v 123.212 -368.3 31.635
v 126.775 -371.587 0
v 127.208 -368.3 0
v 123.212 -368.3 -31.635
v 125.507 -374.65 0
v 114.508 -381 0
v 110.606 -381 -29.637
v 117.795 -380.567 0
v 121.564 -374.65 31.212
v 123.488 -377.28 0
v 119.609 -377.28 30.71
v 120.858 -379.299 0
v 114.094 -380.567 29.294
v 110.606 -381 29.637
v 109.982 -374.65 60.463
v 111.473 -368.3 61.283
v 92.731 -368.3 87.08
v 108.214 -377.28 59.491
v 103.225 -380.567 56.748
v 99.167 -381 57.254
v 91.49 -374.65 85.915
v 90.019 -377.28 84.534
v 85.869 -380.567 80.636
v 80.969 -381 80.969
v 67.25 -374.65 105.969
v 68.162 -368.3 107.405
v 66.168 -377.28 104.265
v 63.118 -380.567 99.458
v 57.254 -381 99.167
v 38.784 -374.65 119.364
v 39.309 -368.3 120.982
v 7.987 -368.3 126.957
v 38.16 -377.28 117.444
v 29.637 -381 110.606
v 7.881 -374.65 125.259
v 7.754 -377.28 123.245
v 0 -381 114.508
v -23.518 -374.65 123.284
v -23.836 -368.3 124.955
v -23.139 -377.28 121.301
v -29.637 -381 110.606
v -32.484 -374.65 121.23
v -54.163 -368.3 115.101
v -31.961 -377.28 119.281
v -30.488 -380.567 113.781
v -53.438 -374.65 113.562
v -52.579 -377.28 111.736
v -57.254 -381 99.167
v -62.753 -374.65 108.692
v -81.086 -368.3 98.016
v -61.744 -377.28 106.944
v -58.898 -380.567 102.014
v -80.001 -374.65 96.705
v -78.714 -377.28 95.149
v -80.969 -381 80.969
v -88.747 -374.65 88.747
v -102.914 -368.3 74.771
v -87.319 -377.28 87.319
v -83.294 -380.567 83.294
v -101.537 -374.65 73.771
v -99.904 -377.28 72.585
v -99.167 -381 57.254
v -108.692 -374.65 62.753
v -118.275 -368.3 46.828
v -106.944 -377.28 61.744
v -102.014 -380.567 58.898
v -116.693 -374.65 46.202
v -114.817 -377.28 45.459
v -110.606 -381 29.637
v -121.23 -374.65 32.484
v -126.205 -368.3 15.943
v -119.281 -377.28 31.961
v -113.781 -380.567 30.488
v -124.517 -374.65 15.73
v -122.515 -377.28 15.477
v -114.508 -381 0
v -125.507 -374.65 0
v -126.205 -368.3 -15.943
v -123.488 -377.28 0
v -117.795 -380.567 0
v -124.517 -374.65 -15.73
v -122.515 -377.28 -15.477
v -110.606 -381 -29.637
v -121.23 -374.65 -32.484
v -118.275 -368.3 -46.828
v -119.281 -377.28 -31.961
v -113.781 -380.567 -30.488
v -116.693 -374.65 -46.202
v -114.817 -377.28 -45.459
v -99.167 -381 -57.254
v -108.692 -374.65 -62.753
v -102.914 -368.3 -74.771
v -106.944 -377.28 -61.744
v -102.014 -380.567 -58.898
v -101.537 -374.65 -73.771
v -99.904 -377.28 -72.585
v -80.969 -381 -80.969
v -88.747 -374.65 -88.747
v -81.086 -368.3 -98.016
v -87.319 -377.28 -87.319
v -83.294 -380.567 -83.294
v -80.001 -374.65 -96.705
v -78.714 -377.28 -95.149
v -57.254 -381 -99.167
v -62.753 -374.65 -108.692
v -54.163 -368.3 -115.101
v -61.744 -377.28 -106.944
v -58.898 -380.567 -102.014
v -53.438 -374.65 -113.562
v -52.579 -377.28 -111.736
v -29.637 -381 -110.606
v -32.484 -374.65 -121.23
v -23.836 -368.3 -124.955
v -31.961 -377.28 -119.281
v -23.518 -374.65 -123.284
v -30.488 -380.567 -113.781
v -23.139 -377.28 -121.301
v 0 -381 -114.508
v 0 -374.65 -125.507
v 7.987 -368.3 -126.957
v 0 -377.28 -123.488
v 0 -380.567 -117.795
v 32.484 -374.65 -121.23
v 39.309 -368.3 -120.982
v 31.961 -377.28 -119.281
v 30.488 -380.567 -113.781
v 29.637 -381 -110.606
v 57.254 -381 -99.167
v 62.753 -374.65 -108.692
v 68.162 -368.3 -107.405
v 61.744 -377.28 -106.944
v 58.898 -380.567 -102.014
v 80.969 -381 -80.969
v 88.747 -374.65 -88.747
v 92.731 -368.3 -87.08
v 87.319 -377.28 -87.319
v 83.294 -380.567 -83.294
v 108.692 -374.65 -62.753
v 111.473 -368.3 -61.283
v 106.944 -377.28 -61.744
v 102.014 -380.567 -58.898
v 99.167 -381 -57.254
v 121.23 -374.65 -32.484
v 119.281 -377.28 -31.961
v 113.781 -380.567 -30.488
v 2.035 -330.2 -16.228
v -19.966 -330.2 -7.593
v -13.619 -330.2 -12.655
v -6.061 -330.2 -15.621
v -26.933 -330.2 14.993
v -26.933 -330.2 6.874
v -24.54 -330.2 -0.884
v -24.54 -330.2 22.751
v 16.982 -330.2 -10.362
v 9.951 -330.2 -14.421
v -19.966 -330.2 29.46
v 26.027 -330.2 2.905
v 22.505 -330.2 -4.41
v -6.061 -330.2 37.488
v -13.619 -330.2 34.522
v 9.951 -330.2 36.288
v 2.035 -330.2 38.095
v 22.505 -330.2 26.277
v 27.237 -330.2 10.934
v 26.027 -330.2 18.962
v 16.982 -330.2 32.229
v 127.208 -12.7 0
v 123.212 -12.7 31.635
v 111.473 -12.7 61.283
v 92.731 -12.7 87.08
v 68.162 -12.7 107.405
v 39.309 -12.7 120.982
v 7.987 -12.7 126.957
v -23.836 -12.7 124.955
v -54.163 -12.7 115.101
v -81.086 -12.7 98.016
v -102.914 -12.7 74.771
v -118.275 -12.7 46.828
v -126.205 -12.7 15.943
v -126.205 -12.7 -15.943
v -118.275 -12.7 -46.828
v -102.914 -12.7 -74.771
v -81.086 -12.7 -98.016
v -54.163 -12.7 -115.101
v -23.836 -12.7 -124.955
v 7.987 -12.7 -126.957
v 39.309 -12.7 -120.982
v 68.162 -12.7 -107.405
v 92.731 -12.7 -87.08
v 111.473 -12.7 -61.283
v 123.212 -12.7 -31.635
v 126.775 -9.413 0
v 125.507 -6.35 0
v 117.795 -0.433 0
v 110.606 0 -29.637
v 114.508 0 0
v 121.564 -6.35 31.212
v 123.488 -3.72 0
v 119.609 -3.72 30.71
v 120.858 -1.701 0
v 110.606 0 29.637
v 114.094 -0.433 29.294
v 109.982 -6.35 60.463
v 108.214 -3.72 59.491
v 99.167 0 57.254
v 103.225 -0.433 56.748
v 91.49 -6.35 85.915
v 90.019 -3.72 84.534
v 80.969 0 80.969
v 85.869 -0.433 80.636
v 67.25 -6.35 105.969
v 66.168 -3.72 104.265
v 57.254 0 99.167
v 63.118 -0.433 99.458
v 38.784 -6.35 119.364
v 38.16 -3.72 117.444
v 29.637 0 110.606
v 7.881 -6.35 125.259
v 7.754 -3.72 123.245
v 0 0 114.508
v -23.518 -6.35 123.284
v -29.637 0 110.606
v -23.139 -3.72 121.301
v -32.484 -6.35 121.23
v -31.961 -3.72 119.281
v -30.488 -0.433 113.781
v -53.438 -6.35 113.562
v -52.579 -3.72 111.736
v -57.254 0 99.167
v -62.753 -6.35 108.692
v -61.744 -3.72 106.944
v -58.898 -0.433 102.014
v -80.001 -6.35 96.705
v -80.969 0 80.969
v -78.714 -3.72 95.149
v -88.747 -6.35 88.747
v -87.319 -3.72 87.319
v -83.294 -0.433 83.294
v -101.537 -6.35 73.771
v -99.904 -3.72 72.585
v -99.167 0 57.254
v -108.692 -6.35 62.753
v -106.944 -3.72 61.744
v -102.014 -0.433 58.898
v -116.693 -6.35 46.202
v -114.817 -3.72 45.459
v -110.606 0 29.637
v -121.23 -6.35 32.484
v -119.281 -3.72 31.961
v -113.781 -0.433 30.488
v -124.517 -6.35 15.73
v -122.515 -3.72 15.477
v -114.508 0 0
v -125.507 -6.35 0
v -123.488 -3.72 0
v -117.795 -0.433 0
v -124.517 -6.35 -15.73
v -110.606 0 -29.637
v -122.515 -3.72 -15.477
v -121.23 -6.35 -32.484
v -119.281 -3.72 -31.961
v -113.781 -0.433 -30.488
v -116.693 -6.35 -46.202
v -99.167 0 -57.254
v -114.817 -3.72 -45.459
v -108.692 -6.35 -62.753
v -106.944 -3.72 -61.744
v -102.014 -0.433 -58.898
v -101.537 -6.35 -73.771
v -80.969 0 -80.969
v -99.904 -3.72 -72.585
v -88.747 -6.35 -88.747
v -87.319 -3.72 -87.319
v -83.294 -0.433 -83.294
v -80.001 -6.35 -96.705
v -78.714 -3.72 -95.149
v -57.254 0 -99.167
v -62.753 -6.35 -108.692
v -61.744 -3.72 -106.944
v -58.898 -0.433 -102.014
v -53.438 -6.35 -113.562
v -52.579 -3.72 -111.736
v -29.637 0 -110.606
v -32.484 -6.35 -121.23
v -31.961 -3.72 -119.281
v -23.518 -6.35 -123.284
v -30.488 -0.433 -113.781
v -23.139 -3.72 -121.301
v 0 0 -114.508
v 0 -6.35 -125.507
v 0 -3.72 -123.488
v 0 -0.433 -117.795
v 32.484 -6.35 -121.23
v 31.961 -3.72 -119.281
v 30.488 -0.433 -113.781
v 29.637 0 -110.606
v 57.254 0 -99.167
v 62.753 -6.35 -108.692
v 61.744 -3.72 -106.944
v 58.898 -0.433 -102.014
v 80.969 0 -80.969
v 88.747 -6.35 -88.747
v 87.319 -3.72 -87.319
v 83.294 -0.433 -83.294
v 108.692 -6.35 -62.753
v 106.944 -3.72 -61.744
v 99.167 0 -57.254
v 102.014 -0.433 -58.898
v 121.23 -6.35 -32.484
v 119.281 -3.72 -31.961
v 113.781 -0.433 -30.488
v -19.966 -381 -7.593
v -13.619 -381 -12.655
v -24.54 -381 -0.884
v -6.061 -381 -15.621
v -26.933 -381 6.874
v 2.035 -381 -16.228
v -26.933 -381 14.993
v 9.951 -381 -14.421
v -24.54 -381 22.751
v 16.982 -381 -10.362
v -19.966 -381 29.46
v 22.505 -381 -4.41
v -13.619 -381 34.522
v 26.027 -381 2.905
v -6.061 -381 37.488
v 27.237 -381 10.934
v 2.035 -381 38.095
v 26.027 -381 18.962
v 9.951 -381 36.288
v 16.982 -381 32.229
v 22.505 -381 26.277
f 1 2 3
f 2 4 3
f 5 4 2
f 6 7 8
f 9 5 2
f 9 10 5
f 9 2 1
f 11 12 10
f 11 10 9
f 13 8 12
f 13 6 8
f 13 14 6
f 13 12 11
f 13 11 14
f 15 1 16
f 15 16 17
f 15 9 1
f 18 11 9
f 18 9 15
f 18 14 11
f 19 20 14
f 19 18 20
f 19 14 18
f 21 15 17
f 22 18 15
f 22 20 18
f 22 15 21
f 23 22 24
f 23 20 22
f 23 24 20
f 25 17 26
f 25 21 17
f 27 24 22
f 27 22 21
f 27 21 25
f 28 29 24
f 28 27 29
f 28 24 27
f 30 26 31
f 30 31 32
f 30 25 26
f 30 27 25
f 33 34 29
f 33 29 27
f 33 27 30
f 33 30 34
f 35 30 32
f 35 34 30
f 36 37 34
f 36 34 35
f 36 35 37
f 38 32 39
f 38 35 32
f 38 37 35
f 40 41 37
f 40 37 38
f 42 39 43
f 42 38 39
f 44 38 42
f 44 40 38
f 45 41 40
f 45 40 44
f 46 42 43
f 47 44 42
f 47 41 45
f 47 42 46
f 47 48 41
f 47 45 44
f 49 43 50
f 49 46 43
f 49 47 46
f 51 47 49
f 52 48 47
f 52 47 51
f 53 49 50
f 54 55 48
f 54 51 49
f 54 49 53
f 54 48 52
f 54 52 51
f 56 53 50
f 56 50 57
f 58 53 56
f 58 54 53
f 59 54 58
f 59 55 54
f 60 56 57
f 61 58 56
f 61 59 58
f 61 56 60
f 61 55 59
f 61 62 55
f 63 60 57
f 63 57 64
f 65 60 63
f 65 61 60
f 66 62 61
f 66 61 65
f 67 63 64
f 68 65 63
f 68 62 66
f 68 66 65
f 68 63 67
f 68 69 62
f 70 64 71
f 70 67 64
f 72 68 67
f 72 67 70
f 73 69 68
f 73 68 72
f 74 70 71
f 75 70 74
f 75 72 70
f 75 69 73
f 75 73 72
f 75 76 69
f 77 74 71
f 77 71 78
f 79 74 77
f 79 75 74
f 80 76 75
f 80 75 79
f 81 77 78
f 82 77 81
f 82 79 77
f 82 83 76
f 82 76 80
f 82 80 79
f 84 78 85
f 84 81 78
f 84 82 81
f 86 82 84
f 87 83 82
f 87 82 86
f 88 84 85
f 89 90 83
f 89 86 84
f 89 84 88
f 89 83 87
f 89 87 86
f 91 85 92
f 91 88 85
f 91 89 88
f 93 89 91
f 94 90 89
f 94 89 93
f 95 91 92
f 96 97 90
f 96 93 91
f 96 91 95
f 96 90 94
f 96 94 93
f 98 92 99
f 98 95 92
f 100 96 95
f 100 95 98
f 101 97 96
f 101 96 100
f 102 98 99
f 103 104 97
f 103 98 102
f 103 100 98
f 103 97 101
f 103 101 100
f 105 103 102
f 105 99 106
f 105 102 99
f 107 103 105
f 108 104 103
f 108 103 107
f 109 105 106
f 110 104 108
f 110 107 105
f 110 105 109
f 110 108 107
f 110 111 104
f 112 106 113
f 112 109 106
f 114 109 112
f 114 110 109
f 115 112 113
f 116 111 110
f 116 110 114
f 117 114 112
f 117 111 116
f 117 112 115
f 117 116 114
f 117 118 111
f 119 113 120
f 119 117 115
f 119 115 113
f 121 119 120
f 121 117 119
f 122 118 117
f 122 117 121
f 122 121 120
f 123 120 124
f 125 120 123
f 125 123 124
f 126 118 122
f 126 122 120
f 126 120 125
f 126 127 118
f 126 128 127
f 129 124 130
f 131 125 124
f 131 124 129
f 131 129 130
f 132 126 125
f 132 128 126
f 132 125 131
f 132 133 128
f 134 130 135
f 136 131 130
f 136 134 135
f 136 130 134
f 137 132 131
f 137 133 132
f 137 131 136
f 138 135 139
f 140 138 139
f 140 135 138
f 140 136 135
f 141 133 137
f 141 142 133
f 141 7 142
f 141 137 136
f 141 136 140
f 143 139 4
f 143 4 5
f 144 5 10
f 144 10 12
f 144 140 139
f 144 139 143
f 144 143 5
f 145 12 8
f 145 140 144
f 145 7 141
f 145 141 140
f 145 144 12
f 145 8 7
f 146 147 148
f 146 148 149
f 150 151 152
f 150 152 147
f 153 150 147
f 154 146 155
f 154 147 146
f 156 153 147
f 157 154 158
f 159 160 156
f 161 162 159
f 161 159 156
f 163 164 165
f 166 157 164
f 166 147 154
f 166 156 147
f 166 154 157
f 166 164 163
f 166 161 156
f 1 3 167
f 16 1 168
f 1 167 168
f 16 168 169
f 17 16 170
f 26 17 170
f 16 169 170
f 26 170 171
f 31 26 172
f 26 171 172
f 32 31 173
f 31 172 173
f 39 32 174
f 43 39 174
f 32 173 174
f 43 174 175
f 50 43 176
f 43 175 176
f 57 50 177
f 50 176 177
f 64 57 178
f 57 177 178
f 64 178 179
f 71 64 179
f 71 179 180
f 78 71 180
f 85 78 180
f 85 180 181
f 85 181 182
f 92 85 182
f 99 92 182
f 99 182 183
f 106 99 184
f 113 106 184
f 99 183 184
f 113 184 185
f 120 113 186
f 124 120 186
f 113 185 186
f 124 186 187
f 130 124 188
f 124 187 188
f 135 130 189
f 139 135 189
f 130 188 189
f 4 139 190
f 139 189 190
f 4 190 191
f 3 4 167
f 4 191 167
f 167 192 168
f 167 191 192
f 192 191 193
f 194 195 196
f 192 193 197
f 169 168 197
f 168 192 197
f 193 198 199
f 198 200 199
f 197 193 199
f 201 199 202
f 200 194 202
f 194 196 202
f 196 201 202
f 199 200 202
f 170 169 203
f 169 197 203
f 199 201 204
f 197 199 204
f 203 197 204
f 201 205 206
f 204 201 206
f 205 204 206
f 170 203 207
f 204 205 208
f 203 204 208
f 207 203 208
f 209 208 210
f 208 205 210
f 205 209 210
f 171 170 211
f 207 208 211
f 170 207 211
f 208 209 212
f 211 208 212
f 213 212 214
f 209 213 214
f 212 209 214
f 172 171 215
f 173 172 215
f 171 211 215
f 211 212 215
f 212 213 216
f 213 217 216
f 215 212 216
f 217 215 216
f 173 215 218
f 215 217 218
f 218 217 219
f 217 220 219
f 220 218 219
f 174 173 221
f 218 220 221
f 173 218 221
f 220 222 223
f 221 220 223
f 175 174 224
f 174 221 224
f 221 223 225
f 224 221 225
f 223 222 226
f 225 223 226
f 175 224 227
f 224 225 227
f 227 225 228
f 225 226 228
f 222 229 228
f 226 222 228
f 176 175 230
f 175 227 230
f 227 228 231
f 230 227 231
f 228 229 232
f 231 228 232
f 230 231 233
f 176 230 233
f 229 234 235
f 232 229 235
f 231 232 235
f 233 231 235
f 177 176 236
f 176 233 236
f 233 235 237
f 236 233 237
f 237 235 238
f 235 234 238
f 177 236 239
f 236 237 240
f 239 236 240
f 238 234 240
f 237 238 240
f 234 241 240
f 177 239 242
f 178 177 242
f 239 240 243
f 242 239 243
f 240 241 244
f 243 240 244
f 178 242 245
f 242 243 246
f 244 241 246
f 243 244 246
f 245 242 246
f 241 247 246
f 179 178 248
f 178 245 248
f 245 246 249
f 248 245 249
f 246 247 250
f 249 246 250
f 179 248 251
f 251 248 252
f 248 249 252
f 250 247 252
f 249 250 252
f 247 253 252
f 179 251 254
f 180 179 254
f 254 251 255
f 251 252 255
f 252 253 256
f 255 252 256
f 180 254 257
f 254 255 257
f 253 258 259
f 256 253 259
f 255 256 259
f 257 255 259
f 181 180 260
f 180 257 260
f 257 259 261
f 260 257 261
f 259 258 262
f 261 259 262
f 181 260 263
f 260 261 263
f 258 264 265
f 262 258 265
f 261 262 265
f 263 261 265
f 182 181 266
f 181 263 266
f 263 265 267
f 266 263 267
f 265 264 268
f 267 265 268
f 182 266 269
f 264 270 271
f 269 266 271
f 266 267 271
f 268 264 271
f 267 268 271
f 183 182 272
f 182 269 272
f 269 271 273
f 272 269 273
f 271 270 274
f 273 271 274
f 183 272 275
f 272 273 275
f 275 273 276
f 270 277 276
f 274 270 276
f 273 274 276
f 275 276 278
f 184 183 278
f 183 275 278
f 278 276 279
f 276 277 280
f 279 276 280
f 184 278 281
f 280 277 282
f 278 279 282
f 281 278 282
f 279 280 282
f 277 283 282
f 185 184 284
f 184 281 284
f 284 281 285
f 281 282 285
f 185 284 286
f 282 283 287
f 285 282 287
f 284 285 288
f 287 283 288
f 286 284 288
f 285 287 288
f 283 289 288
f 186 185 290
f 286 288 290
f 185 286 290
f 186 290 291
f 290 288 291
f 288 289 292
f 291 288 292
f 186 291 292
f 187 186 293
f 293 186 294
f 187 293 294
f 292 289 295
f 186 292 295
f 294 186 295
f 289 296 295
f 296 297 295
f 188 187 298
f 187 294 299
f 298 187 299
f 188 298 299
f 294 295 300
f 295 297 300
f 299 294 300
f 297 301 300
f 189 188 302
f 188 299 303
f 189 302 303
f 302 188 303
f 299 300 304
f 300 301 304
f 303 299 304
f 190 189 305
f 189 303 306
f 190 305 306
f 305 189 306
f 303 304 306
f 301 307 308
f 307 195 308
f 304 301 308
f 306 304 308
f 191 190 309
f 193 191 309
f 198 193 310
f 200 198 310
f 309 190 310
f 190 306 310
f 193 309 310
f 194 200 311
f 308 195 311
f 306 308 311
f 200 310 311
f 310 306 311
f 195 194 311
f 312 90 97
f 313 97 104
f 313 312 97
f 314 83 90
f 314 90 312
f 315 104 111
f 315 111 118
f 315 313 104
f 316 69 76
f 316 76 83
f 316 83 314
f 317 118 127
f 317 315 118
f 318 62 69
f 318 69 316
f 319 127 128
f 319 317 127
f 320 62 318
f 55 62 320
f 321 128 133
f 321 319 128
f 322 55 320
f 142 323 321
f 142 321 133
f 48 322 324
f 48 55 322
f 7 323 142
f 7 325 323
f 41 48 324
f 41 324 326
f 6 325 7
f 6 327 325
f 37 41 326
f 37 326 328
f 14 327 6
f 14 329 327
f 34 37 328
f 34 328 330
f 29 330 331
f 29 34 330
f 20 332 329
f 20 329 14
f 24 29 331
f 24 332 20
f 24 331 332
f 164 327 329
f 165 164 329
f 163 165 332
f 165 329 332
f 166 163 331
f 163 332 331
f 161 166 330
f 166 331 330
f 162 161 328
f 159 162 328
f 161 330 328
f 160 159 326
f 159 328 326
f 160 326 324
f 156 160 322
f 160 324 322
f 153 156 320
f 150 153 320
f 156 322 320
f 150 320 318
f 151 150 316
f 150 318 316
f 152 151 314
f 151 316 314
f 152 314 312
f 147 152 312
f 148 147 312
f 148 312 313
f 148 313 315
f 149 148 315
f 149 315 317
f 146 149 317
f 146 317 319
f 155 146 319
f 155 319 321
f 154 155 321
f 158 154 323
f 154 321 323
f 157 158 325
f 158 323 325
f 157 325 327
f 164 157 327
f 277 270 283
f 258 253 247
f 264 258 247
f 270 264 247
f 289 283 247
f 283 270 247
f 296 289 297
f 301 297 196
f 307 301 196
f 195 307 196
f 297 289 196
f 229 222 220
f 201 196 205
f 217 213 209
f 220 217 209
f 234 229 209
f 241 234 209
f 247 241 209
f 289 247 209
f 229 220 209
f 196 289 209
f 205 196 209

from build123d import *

# Parameters (mm, degrees)
F0_R     = 127.208159
F1_DEPTH = 381
F2_R     = 27.237413
F3_DEPTH = 50.8
F4_R     = 12.7
F5_R     = 12.7


with BuildPart() as f1:
    # F0 (on Front) → F1 (new body)
    with BuildSketch(Plane.XZ):
        Circle(F0_R)
    extrude(amount=F1_DEPTH)

    # F2 (on face) → F3 (cut)
    with BuildSketch(Plane.XZ.offset(381)):
        with Locations((0, 10.933507)):
            Circle(F2_R)
    extrude(amount=-F3_DEPTH, mode=Mode.SUBTRACT)

    # F4
    f4_edges = [f1.edges().sort_by_distance(p)[0] for p in [
        (-127.208159, -381, 0),
    ]]
    fillet(f4_edges, radius=F4_R)

    # F5
    f5_edges = [f1.edges().sort_by_distance(p)[0] for p in [
        (-127.208159, 0, 0),
    ]]
    fillet(f5_edges, radius=F5_R)


solid = f1.part
